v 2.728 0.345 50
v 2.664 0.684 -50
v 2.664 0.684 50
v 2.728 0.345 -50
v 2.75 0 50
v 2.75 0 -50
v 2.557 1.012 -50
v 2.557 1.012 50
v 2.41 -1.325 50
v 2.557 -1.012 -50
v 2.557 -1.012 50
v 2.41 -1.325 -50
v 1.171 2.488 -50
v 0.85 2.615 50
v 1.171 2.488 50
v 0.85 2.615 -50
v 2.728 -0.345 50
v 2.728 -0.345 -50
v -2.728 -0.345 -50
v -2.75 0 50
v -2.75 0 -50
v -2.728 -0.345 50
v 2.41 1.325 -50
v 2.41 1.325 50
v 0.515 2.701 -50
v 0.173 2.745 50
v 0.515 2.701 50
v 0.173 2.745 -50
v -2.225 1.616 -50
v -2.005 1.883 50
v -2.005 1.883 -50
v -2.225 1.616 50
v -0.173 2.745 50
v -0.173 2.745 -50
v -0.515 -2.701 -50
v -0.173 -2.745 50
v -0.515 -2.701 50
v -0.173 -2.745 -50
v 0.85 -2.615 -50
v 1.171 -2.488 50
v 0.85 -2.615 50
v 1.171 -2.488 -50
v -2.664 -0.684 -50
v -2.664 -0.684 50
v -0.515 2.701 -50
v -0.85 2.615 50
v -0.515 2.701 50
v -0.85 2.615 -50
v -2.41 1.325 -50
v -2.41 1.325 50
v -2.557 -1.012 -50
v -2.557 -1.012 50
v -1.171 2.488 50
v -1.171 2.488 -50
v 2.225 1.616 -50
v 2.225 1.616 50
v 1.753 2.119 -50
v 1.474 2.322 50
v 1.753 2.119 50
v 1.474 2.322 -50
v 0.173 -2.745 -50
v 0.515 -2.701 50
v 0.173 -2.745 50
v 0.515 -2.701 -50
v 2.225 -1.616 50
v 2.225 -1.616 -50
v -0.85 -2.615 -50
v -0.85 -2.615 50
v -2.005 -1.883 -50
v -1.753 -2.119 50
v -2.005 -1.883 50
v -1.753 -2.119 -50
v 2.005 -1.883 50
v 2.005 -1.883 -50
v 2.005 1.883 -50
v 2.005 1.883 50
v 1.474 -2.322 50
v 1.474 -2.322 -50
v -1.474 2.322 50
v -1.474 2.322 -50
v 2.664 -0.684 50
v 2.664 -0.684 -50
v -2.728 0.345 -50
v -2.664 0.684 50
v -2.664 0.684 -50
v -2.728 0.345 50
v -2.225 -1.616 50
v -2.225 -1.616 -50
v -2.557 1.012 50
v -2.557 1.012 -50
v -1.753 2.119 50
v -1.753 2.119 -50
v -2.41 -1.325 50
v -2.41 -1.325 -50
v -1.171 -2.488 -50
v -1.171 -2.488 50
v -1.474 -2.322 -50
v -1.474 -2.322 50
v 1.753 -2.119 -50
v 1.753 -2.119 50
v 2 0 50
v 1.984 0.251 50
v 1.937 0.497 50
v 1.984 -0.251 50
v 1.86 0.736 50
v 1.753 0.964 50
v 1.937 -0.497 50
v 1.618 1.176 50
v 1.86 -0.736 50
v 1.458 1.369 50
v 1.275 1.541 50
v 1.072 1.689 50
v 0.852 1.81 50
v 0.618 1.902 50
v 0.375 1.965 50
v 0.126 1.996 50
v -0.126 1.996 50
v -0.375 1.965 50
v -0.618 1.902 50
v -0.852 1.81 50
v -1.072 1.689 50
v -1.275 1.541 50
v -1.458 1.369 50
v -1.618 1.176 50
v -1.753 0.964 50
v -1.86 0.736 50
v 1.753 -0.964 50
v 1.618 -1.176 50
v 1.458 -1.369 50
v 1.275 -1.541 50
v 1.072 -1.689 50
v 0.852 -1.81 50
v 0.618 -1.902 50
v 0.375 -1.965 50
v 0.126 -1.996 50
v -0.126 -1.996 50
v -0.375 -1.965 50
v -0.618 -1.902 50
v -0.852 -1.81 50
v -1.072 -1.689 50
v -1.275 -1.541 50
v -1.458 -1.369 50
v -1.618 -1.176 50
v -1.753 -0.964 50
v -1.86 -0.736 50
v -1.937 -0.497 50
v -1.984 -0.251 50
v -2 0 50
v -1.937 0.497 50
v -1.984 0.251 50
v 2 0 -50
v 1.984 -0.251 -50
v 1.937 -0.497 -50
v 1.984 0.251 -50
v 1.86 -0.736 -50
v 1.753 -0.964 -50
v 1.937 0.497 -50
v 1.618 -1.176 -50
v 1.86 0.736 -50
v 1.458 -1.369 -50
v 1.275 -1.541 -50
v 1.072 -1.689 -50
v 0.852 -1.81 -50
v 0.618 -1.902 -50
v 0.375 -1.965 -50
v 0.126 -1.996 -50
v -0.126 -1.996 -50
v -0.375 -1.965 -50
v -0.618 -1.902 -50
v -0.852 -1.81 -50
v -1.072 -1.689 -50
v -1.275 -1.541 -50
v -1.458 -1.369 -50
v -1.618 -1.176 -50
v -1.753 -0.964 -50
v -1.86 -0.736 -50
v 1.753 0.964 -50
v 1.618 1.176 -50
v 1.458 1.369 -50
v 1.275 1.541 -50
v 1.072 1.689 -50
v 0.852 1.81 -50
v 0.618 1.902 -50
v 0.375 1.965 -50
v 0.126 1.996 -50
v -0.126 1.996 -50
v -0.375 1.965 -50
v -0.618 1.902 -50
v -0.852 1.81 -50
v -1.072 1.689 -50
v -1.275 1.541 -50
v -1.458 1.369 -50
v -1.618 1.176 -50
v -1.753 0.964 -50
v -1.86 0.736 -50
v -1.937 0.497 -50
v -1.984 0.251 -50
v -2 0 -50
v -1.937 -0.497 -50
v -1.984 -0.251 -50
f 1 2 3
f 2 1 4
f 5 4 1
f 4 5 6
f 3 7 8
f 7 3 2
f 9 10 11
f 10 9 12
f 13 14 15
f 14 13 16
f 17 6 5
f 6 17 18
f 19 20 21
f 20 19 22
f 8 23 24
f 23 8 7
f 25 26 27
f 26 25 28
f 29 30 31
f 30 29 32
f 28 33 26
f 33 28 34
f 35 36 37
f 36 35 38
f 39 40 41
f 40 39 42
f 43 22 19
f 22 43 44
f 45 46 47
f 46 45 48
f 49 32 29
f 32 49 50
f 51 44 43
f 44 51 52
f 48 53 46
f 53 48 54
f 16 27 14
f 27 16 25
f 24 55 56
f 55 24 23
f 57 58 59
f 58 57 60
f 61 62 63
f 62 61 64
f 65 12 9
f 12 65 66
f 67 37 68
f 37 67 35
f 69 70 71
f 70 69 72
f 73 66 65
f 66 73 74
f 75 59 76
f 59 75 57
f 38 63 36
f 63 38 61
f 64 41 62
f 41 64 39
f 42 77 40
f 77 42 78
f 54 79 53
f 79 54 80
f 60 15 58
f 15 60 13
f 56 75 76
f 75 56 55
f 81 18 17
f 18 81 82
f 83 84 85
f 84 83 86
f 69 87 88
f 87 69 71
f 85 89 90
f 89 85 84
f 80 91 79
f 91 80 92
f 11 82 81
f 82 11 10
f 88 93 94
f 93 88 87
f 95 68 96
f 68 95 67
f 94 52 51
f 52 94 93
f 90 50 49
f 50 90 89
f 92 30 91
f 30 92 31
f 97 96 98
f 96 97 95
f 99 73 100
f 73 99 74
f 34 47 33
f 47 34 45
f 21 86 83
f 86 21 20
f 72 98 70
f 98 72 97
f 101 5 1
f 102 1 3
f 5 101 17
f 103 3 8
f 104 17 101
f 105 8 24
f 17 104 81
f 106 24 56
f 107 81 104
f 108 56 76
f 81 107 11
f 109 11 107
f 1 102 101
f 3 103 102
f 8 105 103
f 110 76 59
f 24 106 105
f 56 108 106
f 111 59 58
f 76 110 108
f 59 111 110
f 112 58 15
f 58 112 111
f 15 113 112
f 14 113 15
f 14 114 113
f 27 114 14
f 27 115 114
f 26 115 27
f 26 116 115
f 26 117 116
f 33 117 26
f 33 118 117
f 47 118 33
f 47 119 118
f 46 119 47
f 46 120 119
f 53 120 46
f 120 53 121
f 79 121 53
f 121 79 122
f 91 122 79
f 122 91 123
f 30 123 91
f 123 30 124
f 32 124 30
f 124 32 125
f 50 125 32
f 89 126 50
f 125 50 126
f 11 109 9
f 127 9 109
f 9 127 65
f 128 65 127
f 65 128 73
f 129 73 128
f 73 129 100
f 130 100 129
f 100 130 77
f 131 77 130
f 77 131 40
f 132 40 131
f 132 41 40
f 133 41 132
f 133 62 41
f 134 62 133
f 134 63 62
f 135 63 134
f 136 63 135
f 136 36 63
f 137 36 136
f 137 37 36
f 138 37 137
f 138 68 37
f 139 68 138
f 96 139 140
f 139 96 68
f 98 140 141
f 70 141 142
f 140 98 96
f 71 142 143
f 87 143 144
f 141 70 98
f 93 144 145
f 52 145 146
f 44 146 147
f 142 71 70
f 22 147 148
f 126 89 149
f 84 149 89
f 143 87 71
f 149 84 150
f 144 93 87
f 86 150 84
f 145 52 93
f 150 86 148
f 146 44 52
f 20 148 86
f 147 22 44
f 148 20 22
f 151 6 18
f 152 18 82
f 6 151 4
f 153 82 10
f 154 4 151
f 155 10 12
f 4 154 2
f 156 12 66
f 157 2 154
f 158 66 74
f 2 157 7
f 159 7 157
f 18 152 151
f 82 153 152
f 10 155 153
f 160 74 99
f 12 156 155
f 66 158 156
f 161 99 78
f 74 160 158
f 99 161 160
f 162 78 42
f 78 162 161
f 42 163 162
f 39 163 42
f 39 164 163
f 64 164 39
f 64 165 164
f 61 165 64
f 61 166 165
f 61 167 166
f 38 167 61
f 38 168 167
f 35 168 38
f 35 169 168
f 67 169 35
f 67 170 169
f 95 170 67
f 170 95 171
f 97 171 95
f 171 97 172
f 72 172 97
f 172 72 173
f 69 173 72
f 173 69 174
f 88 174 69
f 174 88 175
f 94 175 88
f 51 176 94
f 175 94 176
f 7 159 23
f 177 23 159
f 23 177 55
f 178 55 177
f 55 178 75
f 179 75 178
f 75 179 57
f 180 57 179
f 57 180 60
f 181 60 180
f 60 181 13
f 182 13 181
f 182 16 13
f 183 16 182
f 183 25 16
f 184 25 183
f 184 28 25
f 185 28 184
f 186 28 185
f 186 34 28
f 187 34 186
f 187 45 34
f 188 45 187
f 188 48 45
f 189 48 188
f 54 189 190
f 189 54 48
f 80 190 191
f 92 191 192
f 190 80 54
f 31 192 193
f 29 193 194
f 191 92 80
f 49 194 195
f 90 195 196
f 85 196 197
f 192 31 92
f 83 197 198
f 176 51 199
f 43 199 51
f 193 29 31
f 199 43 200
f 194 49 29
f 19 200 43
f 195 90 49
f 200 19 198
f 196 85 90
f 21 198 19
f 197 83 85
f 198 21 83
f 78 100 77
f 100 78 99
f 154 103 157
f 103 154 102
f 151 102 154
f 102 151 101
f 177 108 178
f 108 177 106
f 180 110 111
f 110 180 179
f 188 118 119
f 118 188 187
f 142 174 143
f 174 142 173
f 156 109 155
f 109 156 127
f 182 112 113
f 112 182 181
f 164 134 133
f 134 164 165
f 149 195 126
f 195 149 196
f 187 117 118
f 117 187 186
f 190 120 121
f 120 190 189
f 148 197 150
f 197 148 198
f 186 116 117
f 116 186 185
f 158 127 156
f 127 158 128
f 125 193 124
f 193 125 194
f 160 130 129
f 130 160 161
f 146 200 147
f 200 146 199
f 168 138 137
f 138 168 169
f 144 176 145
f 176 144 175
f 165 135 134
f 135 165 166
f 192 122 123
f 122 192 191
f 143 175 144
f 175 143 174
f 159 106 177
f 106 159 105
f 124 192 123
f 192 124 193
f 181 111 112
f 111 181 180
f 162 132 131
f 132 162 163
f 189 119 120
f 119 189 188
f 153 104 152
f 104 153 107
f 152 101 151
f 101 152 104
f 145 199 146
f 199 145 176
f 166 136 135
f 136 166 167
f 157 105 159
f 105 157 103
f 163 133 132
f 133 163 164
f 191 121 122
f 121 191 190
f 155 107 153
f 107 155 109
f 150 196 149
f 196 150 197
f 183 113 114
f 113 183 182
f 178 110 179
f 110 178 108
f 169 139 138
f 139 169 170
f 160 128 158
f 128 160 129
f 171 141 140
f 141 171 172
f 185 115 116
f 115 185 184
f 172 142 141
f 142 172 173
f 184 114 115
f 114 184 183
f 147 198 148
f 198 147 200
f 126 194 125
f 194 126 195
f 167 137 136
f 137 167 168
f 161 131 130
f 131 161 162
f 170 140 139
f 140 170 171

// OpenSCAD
$fn = 50;


difference() {
	union() {
		translate(v = [0, 0, -50.0000000000]) {
			cylinder(h = 100, r = 2.7500000000);
		}
	}
	union() {
		translate(v = [0, 0, -100.0000000000]) {
			cylinder(h = 200, r = 2.0000000000);
		}
	}
}
